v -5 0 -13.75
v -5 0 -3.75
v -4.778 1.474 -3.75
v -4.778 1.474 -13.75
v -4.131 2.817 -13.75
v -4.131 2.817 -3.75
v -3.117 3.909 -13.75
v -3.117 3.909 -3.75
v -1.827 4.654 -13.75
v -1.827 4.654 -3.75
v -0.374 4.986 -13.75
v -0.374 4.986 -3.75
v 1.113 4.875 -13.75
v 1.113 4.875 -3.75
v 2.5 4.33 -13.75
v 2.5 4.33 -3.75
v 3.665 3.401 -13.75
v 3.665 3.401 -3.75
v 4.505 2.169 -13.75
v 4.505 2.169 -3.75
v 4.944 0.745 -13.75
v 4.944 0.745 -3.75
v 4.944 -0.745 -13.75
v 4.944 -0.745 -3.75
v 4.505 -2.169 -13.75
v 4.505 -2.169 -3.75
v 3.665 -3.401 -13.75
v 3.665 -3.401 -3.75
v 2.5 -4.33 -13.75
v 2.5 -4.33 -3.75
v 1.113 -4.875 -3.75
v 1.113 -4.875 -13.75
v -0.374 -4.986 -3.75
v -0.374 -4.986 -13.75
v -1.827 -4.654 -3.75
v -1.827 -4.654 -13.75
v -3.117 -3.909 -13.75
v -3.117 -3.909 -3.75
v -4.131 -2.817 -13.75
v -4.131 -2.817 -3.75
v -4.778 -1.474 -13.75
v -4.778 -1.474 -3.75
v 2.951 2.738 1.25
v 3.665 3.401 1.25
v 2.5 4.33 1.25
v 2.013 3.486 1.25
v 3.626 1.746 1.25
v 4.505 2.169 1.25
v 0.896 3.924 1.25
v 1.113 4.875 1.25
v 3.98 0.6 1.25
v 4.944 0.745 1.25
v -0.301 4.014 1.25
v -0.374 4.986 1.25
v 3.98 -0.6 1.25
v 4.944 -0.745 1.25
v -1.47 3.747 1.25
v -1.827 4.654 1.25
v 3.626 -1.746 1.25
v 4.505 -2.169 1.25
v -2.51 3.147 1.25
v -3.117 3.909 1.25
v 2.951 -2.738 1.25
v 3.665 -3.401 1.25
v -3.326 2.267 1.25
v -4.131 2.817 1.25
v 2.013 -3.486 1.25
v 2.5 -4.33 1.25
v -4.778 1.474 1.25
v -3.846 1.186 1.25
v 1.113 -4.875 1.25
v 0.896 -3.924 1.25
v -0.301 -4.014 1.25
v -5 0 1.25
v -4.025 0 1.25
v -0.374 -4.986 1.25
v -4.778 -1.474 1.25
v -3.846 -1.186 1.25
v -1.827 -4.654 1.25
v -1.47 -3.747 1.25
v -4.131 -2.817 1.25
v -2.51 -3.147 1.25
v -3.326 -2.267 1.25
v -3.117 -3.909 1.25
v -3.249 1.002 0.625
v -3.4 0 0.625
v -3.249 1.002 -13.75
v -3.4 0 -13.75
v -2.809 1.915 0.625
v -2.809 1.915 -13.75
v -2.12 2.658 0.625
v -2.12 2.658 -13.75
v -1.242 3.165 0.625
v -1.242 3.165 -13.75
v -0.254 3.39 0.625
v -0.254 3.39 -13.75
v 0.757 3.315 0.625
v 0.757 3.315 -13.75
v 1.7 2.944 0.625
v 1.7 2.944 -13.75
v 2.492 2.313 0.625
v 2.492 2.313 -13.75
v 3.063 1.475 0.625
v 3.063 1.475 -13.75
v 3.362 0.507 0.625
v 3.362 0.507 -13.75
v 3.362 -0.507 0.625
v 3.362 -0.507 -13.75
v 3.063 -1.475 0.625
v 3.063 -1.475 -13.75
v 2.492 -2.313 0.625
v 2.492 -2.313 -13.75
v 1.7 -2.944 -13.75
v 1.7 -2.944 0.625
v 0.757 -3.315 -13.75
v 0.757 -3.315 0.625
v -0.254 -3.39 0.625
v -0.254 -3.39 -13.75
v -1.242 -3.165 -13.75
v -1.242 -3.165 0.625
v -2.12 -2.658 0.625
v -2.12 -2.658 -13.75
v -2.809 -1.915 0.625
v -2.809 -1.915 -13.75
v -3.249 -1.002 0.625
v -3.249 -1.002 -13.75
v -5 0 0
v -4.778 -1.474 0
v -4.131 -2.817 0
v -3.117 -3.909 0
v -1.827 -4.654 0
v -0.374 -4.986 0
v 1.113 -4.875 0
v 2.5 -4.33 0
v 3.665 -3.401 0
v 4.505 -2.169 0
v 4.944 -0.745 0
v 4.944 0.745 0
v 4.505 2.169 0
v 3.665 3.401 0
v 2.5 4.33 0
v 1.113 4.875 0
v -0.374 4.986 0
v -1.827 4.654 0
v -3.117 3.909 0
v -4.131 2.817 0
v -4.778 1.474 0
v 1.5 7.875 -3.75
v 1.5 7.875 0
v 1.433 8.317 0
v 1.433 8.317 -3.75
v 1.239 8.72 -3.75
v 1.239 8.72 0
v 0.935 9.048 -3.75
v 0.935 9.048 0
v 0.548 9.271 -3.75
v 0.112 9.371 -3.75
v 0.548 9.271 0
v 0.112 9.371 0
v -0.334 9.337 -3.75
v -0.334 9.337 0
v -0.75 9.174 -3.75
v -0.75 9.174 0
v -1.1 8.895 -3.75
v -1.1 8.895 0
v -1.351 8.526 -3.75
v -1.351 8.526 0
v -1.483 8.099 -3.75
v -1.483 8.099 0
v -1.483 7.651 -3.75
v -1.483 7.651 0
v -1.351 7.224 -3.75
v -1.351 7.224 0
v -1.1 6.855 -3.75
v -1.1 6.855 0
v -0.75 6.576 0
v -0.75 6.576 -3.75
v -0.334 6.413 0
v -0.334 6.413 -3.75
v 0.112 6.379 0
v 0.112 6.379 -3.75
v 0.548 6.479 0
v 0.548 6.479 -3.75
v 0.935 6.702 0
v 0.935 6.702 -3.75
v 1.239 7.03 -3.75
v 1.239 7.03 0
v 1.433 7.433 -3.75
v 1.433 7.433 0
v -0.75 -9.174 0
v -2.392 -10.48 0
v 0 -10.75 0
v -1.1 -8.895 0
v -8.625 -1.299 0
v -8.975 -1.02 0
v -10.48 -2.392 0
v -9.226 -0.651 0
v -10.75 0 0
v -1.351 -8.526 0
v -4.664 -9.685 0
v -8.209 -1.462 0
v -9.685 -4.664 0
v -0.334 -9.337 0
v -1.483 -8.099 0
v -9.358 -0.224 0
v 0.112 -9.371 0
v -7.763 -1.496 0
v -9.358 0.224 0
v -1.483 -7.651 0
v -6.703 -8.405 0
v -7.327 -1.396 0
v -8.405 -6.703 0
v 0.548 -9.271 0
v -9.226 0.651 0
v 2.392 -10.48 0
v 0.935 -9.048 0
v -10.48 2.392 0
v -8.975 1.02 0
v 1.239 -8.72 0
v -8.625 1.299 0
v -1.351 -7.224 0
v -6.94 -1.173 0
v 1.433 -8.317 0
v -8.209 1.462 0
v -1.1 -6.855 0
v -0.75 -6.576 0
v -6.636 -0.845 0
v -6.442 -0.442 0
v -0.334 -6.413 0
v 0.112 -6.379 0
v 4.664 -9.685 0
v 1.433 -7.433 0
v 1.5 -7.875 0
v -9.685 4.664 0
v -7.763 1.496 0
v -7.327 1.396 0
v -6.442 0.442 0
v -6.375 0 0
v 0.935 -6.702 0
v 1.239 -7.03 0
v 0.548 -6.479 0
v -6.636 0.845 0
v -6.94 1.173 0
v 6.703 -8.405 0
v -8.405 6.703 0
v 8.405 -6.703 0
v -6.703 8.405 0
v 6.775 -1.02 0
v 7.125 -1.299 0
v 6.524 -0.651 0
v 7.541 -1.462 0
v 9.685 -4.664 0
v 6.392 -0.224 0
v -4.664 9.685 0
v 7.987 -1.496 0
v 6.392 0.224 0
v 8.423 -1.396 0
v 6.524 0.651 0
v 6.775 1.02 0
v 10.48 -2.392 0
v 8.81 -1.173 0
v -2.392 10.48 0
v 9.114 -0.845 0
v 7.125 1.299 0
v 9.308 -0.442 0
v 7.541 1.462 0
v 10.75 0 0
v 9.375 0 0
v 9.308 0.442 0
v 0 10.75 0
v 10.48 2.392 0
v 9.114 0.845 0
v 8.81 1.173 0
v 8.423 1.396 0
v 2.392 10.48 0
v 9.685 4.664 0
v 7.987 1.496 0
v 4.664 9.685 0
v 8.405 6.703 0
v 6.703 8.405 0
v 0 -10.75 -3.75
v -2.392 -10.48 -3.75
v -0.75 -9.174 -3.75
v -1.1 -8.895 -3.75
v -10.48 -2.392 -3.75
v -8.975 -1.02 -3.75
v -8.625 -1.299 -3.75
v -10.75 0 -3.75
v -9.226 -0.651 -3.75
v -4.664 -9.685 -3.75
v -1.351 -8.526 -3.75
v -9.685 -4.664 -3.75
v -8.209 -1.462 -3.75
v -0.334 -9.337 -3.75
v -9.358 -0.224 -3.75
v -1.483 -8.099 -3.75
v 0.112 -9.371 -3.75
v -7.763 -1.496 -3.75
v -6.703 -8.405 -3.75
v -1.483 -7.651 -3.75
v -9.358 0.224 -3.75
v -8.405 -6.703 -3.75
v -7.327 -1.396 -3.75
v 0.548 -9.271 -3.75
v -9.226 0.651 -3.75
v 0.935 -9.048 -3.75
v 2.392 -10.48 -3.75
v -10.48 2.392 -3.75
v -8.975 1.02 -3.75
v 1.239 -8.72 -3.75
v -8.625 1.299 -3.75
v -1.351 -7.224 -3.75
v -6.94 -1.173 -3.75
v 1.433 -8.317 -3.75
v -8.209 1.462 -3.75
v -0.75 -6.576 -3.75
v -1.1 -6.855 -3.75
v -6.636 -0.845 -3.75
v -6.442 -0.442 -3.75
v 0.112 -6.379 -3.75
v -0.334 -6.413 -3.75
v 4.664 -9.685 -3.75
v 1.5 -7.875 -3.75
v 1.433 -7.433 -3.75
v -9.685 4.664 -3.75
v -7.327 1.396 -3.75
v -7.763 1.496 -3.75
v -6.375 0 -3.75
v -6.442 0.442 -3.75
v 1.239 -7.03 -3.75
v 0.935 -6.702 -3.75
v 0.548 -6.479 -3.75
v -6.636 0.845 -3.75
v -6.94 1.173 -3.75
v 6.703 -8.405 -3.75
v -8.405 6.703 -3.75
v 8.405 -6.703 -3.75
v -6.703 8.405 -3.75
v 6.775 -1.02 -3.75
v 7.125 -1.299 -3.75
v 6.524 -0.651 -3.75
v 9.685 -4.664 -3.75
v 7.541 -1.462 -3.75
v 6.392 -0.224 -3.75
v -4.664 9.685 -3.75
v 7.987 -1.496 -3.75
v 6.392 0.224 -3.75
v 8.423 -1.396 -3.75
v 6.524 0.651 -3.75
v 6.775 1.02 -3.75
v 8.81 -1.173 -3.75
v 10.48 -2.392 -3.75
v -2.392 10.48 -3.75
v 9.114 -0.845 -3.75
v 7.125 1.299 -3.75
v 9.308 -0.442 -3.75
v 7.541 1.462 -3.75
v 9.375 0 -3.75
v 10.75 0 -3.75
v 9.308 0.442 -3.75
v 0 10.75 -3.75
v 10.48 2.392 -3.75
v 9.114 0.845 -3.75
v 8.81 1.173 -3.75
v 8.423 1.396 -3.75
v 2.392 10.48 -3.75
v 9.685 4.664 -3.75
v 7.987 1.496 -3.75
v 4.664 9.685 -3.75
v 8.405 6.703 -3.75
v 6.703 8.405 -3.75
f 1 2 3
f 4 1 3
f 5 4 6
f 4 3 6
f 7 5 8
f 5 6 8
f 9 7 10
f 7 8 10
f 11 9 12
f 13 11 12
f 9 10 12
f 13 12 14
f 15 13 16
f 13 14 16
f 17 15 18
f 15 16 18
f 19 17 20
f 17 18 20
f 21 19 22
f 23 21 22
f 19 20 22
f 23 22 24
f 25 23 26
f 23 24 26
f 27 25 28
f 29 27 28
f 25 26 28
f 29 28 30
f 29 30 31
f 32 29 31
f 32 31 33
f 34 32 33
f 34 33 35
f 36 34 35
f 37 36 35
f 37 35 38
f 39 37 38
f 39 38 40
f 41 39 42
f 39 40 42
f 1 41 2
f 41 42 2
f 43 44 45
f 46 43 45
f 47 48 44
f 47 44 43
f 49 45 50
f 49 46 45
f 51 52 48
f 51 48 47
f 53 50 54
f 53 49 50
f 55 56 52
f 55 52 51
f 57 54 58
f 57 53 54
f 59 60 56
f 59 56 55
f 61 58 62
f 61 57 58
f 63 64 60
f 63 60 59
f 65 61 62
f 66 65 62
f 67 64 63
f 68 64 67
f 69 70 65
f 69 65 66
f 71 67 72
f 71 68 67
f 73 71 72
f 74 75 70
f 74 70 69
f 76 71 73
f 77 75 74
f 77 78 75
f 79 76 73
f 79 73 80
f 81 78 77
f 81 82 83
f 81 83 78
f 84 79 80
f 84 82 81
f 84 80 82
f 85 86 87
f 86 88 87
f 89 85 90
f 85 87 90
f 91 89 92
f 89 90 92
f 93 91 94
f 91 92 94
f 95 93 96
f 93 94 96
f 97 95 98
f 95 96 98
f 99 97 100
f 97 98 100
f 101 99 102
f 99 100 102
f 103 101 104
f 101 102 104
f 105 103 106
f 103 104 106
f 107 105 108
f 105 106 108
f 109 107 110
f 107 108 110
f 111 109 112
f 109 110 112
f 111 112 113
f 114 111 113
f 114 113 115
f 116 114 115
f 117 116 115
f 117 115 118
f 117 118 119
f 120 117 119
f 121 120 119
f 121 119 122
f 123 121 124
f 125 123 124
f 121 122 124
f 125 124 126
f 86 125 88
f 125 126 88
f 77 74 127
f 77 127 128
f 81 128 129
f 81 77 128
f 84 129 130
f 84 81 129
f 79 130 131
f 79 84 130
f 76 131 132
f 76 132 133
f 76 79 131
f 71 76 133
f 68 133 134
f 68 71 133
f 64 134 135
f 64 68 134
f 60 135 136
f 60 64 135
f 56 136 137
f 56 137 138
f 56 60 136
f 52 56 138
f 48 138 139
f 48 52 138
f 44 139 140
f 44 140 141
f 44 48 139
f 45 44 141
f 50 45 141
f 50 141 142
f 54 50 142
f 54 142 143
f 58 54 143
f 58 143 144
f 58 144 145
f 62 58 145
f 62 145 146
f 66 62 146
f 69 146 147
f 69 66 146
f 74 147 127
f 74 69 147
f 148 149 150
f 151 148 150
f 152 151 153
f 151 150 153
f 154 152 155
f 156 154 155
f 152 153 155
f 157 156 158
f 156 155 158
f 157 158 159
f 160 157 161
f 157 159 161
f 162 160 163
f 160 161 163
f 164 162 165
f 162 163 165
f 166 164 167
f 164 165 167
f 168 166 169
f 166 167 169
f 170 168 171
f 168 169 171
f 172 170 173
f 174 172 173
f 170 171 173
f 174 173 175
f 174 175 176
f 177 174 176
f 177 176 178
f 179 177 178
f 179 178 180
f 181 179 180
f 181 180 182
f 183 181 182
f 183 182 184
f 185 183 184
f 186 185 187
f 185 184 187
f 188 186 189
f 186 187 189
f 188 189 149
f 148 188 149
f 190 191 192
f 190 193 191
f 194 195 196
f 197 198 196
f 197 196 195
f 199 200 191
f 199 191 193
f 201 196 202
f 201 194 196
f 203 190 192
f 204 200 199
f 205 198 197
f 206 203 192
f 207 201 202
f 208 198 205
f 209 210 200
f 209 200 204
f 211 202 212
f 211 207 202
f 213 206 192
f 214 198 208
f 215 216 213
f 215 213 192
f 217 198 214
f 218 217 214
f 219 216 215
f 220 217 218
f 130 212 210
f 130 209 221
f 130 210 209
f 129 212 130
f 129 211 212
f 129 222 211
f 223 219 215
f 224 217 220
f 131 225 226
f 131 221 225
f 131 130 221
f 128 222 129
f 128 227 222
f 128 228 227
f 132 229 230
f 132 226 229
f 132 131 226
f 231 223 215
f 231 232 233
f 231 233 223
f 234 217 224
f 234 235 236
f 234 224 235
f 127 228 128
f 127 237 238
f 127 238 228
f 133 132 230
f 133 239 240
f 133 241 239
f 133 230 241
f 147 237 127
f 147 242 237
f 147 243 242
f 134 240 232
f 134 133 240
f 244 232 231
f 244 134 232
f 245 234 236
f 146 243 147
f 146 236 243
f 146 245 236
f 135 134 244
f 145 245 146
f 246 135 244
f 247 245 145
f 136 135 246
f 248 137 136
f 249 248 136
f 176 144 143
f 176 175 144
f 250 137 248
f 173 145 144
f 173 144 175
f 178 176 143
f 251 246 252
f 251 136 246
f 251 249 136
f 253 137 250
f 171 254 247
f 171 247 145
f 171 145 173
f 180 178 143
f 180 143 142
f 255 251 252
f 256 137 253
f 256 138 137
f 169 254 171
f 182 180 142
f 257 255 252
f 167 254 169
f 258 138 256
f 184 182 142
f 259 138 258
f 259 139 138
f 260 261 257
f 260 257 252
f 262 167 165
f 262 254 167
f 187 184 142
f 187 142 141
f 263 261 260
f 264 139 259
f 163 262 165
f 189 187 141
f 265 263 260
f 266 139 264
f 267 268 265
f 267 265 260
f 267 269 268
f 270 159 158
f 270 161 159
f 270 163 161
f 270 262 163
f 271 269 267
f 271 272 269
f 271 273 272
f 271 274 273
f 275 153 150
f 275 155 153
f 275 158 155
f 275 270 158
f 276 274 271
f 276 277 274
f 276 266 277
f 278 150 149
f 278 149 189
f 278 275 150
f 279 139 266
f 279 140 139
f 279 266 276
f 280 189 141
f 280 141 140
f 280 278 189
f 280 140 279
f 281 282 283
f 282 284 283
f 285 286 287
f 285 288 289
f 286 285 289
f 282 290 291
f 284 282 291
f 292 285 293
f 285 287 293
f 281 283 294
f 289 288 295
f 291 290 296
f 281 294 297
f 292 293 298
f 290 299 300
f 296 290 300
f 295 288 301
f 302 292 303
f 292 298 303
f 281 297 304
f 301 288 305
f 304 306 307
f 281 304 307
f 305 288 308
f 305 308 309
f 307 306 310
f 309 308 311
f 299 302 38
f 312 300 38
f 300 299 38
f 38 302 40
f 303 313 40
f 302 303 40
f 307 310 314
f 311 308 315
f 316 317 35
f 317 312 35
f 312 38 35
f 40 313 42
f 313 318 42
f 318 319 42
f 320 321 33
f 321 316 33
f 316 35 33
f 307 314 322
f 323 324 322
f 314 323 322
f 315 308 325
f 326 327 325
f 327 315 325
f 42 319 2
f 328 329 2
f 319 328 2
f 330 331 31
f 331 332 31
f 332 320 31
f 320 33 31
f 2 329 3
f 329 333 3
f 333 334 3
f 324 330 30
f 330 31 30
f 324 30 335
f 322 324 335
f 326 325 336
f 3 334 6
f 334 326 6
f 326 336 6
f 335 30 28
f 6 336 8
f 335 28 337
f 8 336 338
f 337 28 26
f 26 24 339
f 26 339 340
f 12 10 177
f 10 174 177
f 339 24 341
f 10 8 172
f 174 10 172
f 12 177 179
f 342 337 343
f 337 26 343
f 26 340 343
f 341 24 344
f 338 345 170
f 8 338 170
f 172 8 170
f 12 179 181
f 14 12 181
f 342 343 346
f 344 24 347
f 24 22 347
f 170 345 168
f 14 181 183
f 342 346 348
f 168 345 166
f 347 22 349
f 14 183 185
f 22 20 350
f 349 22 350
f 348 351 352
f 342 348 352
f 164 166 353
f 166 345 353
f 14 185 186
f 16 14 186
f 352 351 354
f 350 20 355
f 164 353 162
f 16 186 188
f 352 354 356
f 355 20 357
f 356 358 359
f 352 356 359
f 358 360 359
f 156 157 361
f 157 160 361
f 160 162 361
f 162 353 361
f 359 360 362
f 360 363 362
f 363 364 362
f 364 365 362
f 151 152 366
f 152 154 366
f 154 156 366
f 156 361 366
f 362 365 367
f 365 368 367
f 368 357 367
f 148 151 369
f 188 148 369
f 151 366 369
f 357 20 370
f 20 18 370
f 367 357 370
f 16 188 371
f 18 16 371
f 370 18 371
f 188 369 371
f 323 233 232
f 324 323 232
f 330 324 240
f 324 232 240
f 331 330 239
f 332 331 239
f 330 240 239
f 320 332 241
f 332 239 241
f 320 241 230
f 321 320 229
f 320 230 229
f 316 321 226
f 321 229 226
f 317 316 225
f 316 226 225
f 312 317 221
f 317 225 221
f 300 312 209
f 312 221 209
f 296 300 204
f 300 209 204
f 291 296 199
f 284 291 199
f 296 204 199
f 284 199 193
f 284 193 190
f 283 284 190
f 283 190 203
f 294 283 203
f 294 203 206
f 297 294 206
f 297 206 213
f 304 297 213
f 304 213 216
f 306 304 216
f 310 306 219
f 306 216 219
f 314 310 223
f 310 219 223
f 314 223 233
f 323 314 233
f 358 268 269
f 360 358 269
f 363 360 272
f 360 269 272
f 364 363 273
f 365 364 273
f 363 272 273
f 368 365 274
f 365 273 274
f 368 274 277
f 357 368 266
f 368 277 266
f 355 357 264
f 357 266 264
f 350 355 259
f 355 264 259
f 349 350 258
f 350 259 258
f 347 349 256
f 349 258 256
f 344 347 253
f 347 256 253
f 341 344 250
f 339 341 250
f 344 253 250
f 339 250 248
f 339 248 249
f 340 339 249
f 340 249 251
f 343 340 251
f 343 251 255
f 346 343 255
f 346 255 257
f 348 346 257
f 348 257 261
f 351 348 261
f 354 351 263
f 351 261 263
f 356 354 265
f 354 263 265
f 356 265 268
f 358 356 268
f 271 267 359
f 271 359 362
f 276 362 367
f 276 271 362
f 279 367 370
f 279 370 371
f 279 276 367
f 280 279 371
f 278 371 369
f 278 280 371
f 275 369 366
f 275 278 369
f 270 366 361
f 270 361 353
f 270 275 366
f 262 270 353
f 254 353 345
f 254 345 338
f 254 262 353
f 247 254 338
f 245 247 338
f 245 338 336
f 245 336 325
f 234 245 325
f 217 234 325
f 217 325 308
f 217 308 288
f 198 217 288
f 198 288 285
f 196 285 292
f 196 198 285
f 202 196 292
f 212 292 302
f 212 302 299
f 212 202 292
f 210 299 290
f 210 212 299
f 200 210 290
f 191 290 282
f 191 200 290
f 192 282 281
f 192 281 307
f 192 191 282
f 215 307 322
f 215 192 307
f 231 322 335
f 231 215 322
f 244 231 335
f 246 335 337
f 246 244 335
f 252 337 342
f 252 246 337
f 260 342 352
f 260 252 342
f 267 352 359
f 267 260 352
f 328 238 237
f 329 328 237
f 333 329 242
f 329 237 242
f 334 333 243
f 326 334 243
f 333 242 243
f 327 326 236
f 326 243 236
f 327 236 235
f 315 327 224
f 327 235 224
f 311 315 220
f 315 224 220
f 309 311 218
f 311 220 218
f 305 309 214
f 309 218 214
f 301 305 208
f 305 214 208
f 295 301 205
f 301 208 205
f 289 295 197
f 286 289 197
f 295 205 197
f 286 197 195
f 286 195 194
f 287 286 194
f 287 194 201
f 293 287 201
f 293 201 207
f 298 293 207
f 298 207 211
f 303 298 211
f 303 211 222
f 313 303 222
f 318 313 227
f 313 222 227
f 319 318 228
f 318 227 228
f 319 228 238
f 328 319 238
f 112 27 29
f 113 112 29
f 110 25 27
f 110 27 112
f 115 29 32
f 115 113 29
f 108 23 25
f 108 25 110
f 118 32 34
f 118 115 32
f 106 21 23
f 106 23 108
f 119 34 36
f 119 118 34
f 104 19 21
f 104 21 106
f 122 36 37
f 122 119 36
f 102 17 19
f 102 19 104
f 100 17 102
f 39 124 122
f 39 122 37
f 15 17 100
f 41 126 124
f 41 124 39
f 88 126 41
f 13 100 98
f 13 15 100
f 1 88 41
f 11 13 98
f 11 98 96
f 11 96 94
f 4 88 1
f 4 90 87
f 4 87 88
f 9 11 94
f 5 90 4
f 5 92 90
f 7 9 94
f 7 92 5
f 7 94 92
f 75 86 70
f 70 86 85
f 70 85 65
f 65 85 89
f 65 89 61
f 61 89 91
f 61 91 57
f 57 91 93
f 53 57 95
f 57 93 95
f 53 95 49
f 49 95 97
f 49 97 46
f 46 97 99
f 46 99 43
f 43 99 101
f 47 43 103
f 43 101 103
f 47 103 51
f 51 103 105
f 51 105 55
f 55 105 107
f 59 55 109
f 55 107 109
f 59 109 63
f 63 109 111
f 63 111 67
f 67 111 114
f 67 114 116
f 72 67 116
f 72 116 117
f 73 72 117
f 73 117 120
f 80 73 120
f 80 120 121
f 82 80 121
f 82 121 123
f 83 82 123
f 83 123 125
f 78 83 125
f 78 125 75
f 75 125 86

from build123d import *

# Parameters (mm, degrees)
SKETCH3_R                   = 10.75
BOSS_EXTRUDE1_DEPTH         = 3.75
SKETCH4_R                   = 5
BOSS_EXTRUDE2_DEPTH         = 10
BOSS_EXTRUDE3_START         = 1.25
SKETCH5_R                   = 5
BOSS_EXTRUDE3_DEPTH         = 1.25
M8_TAPPED_HOLE1_D           = 6.8
M8_TAPPED_HOLE1_DEPTH       = 15
M8_TAPPED_HOLE1_CSINK_D     = 8.05
M8_TAPPED_HOLE1_CSINK_ANGLE = 90
M8_TAPPED_HOLE1_TIP         = 2.042926105
SKETCH9_R                   = 1.5
CUT_EXTRUDE1_DEPTH          = 3.75


with BuildPart() as part:
    # Sketch3 → Boss-Extrude1 (new body)
    with BuildSketch(Plane.XY):
        Circle(SKETCH3_R)
    extrude(amount=-BOSS_EXTRUDE1_DEPTH)

    # Sketch4 → Boss-Extrude2 (add)
    with BuildSketch(Plane(origin=(0, 0, -3.75), x_dir=(-1, 0, 0), z_dir=(0, 0, -1))):
        Circle(SKETCH4_R)
    extrude(amount=BOSS_EXTRUDE2_DEPTH)

    # Sketch5 → Boss-Extrude3 (add)
    with BuildSketch(Plane.XY.offset(BOSS_EXTRUDE3_START)):
        with Locations(Location((0, 0, 0), (0, 0, 180))):
            Circle(SKETCH5_R)
    extrude(amount=-BOSS_EXTRUDE3_DEPTH)

    # M8 Tapped Hole1
    with Locations(Plane.XY.offset(1.25)):
        with Locations((0, 0)):
            CounterSinkHole(M8_TAPPED_HOLE1_D / 2, M8_TAPPED_HOLE1_CSINK_D / 2, depth=M8_TAPPED_HOLE1_DEPTH, counter_sink_angle=M8_TAPPED_HOLE1_CSINK_ANGLE)
            with Locations((0, 0, -(M8_TAPPED_HOLE1_DEPTH + M8_TAPPED_HOLE1_TIP / 2))):  # 118° drill point
                Cone(0, M8_TAPPED_HOLE1_D / 2, M8_TAPPED_HOLE1_TIP, mode=Mode.SUBTRACT)

    # Sketch9 → Cut-Extrude1 (cut)
    with BuildSketch(Plane.XY):
        with Locations((-7.875, 0)):
            Circle(SKETCH9_R)
        with Locations((0, 7.875)):
            Circle(SKETCH9_R)
        with Locations((7.875, 0)):
            Circle(SKETCH9_R)
        with Locations((0, -7.875)):
            Circle(SKETCH9_R)
    extrude(amount=-CUT_EXTRUDE1_DEPTH, mode=Mode.SUBTRACT)


solid = part.part
